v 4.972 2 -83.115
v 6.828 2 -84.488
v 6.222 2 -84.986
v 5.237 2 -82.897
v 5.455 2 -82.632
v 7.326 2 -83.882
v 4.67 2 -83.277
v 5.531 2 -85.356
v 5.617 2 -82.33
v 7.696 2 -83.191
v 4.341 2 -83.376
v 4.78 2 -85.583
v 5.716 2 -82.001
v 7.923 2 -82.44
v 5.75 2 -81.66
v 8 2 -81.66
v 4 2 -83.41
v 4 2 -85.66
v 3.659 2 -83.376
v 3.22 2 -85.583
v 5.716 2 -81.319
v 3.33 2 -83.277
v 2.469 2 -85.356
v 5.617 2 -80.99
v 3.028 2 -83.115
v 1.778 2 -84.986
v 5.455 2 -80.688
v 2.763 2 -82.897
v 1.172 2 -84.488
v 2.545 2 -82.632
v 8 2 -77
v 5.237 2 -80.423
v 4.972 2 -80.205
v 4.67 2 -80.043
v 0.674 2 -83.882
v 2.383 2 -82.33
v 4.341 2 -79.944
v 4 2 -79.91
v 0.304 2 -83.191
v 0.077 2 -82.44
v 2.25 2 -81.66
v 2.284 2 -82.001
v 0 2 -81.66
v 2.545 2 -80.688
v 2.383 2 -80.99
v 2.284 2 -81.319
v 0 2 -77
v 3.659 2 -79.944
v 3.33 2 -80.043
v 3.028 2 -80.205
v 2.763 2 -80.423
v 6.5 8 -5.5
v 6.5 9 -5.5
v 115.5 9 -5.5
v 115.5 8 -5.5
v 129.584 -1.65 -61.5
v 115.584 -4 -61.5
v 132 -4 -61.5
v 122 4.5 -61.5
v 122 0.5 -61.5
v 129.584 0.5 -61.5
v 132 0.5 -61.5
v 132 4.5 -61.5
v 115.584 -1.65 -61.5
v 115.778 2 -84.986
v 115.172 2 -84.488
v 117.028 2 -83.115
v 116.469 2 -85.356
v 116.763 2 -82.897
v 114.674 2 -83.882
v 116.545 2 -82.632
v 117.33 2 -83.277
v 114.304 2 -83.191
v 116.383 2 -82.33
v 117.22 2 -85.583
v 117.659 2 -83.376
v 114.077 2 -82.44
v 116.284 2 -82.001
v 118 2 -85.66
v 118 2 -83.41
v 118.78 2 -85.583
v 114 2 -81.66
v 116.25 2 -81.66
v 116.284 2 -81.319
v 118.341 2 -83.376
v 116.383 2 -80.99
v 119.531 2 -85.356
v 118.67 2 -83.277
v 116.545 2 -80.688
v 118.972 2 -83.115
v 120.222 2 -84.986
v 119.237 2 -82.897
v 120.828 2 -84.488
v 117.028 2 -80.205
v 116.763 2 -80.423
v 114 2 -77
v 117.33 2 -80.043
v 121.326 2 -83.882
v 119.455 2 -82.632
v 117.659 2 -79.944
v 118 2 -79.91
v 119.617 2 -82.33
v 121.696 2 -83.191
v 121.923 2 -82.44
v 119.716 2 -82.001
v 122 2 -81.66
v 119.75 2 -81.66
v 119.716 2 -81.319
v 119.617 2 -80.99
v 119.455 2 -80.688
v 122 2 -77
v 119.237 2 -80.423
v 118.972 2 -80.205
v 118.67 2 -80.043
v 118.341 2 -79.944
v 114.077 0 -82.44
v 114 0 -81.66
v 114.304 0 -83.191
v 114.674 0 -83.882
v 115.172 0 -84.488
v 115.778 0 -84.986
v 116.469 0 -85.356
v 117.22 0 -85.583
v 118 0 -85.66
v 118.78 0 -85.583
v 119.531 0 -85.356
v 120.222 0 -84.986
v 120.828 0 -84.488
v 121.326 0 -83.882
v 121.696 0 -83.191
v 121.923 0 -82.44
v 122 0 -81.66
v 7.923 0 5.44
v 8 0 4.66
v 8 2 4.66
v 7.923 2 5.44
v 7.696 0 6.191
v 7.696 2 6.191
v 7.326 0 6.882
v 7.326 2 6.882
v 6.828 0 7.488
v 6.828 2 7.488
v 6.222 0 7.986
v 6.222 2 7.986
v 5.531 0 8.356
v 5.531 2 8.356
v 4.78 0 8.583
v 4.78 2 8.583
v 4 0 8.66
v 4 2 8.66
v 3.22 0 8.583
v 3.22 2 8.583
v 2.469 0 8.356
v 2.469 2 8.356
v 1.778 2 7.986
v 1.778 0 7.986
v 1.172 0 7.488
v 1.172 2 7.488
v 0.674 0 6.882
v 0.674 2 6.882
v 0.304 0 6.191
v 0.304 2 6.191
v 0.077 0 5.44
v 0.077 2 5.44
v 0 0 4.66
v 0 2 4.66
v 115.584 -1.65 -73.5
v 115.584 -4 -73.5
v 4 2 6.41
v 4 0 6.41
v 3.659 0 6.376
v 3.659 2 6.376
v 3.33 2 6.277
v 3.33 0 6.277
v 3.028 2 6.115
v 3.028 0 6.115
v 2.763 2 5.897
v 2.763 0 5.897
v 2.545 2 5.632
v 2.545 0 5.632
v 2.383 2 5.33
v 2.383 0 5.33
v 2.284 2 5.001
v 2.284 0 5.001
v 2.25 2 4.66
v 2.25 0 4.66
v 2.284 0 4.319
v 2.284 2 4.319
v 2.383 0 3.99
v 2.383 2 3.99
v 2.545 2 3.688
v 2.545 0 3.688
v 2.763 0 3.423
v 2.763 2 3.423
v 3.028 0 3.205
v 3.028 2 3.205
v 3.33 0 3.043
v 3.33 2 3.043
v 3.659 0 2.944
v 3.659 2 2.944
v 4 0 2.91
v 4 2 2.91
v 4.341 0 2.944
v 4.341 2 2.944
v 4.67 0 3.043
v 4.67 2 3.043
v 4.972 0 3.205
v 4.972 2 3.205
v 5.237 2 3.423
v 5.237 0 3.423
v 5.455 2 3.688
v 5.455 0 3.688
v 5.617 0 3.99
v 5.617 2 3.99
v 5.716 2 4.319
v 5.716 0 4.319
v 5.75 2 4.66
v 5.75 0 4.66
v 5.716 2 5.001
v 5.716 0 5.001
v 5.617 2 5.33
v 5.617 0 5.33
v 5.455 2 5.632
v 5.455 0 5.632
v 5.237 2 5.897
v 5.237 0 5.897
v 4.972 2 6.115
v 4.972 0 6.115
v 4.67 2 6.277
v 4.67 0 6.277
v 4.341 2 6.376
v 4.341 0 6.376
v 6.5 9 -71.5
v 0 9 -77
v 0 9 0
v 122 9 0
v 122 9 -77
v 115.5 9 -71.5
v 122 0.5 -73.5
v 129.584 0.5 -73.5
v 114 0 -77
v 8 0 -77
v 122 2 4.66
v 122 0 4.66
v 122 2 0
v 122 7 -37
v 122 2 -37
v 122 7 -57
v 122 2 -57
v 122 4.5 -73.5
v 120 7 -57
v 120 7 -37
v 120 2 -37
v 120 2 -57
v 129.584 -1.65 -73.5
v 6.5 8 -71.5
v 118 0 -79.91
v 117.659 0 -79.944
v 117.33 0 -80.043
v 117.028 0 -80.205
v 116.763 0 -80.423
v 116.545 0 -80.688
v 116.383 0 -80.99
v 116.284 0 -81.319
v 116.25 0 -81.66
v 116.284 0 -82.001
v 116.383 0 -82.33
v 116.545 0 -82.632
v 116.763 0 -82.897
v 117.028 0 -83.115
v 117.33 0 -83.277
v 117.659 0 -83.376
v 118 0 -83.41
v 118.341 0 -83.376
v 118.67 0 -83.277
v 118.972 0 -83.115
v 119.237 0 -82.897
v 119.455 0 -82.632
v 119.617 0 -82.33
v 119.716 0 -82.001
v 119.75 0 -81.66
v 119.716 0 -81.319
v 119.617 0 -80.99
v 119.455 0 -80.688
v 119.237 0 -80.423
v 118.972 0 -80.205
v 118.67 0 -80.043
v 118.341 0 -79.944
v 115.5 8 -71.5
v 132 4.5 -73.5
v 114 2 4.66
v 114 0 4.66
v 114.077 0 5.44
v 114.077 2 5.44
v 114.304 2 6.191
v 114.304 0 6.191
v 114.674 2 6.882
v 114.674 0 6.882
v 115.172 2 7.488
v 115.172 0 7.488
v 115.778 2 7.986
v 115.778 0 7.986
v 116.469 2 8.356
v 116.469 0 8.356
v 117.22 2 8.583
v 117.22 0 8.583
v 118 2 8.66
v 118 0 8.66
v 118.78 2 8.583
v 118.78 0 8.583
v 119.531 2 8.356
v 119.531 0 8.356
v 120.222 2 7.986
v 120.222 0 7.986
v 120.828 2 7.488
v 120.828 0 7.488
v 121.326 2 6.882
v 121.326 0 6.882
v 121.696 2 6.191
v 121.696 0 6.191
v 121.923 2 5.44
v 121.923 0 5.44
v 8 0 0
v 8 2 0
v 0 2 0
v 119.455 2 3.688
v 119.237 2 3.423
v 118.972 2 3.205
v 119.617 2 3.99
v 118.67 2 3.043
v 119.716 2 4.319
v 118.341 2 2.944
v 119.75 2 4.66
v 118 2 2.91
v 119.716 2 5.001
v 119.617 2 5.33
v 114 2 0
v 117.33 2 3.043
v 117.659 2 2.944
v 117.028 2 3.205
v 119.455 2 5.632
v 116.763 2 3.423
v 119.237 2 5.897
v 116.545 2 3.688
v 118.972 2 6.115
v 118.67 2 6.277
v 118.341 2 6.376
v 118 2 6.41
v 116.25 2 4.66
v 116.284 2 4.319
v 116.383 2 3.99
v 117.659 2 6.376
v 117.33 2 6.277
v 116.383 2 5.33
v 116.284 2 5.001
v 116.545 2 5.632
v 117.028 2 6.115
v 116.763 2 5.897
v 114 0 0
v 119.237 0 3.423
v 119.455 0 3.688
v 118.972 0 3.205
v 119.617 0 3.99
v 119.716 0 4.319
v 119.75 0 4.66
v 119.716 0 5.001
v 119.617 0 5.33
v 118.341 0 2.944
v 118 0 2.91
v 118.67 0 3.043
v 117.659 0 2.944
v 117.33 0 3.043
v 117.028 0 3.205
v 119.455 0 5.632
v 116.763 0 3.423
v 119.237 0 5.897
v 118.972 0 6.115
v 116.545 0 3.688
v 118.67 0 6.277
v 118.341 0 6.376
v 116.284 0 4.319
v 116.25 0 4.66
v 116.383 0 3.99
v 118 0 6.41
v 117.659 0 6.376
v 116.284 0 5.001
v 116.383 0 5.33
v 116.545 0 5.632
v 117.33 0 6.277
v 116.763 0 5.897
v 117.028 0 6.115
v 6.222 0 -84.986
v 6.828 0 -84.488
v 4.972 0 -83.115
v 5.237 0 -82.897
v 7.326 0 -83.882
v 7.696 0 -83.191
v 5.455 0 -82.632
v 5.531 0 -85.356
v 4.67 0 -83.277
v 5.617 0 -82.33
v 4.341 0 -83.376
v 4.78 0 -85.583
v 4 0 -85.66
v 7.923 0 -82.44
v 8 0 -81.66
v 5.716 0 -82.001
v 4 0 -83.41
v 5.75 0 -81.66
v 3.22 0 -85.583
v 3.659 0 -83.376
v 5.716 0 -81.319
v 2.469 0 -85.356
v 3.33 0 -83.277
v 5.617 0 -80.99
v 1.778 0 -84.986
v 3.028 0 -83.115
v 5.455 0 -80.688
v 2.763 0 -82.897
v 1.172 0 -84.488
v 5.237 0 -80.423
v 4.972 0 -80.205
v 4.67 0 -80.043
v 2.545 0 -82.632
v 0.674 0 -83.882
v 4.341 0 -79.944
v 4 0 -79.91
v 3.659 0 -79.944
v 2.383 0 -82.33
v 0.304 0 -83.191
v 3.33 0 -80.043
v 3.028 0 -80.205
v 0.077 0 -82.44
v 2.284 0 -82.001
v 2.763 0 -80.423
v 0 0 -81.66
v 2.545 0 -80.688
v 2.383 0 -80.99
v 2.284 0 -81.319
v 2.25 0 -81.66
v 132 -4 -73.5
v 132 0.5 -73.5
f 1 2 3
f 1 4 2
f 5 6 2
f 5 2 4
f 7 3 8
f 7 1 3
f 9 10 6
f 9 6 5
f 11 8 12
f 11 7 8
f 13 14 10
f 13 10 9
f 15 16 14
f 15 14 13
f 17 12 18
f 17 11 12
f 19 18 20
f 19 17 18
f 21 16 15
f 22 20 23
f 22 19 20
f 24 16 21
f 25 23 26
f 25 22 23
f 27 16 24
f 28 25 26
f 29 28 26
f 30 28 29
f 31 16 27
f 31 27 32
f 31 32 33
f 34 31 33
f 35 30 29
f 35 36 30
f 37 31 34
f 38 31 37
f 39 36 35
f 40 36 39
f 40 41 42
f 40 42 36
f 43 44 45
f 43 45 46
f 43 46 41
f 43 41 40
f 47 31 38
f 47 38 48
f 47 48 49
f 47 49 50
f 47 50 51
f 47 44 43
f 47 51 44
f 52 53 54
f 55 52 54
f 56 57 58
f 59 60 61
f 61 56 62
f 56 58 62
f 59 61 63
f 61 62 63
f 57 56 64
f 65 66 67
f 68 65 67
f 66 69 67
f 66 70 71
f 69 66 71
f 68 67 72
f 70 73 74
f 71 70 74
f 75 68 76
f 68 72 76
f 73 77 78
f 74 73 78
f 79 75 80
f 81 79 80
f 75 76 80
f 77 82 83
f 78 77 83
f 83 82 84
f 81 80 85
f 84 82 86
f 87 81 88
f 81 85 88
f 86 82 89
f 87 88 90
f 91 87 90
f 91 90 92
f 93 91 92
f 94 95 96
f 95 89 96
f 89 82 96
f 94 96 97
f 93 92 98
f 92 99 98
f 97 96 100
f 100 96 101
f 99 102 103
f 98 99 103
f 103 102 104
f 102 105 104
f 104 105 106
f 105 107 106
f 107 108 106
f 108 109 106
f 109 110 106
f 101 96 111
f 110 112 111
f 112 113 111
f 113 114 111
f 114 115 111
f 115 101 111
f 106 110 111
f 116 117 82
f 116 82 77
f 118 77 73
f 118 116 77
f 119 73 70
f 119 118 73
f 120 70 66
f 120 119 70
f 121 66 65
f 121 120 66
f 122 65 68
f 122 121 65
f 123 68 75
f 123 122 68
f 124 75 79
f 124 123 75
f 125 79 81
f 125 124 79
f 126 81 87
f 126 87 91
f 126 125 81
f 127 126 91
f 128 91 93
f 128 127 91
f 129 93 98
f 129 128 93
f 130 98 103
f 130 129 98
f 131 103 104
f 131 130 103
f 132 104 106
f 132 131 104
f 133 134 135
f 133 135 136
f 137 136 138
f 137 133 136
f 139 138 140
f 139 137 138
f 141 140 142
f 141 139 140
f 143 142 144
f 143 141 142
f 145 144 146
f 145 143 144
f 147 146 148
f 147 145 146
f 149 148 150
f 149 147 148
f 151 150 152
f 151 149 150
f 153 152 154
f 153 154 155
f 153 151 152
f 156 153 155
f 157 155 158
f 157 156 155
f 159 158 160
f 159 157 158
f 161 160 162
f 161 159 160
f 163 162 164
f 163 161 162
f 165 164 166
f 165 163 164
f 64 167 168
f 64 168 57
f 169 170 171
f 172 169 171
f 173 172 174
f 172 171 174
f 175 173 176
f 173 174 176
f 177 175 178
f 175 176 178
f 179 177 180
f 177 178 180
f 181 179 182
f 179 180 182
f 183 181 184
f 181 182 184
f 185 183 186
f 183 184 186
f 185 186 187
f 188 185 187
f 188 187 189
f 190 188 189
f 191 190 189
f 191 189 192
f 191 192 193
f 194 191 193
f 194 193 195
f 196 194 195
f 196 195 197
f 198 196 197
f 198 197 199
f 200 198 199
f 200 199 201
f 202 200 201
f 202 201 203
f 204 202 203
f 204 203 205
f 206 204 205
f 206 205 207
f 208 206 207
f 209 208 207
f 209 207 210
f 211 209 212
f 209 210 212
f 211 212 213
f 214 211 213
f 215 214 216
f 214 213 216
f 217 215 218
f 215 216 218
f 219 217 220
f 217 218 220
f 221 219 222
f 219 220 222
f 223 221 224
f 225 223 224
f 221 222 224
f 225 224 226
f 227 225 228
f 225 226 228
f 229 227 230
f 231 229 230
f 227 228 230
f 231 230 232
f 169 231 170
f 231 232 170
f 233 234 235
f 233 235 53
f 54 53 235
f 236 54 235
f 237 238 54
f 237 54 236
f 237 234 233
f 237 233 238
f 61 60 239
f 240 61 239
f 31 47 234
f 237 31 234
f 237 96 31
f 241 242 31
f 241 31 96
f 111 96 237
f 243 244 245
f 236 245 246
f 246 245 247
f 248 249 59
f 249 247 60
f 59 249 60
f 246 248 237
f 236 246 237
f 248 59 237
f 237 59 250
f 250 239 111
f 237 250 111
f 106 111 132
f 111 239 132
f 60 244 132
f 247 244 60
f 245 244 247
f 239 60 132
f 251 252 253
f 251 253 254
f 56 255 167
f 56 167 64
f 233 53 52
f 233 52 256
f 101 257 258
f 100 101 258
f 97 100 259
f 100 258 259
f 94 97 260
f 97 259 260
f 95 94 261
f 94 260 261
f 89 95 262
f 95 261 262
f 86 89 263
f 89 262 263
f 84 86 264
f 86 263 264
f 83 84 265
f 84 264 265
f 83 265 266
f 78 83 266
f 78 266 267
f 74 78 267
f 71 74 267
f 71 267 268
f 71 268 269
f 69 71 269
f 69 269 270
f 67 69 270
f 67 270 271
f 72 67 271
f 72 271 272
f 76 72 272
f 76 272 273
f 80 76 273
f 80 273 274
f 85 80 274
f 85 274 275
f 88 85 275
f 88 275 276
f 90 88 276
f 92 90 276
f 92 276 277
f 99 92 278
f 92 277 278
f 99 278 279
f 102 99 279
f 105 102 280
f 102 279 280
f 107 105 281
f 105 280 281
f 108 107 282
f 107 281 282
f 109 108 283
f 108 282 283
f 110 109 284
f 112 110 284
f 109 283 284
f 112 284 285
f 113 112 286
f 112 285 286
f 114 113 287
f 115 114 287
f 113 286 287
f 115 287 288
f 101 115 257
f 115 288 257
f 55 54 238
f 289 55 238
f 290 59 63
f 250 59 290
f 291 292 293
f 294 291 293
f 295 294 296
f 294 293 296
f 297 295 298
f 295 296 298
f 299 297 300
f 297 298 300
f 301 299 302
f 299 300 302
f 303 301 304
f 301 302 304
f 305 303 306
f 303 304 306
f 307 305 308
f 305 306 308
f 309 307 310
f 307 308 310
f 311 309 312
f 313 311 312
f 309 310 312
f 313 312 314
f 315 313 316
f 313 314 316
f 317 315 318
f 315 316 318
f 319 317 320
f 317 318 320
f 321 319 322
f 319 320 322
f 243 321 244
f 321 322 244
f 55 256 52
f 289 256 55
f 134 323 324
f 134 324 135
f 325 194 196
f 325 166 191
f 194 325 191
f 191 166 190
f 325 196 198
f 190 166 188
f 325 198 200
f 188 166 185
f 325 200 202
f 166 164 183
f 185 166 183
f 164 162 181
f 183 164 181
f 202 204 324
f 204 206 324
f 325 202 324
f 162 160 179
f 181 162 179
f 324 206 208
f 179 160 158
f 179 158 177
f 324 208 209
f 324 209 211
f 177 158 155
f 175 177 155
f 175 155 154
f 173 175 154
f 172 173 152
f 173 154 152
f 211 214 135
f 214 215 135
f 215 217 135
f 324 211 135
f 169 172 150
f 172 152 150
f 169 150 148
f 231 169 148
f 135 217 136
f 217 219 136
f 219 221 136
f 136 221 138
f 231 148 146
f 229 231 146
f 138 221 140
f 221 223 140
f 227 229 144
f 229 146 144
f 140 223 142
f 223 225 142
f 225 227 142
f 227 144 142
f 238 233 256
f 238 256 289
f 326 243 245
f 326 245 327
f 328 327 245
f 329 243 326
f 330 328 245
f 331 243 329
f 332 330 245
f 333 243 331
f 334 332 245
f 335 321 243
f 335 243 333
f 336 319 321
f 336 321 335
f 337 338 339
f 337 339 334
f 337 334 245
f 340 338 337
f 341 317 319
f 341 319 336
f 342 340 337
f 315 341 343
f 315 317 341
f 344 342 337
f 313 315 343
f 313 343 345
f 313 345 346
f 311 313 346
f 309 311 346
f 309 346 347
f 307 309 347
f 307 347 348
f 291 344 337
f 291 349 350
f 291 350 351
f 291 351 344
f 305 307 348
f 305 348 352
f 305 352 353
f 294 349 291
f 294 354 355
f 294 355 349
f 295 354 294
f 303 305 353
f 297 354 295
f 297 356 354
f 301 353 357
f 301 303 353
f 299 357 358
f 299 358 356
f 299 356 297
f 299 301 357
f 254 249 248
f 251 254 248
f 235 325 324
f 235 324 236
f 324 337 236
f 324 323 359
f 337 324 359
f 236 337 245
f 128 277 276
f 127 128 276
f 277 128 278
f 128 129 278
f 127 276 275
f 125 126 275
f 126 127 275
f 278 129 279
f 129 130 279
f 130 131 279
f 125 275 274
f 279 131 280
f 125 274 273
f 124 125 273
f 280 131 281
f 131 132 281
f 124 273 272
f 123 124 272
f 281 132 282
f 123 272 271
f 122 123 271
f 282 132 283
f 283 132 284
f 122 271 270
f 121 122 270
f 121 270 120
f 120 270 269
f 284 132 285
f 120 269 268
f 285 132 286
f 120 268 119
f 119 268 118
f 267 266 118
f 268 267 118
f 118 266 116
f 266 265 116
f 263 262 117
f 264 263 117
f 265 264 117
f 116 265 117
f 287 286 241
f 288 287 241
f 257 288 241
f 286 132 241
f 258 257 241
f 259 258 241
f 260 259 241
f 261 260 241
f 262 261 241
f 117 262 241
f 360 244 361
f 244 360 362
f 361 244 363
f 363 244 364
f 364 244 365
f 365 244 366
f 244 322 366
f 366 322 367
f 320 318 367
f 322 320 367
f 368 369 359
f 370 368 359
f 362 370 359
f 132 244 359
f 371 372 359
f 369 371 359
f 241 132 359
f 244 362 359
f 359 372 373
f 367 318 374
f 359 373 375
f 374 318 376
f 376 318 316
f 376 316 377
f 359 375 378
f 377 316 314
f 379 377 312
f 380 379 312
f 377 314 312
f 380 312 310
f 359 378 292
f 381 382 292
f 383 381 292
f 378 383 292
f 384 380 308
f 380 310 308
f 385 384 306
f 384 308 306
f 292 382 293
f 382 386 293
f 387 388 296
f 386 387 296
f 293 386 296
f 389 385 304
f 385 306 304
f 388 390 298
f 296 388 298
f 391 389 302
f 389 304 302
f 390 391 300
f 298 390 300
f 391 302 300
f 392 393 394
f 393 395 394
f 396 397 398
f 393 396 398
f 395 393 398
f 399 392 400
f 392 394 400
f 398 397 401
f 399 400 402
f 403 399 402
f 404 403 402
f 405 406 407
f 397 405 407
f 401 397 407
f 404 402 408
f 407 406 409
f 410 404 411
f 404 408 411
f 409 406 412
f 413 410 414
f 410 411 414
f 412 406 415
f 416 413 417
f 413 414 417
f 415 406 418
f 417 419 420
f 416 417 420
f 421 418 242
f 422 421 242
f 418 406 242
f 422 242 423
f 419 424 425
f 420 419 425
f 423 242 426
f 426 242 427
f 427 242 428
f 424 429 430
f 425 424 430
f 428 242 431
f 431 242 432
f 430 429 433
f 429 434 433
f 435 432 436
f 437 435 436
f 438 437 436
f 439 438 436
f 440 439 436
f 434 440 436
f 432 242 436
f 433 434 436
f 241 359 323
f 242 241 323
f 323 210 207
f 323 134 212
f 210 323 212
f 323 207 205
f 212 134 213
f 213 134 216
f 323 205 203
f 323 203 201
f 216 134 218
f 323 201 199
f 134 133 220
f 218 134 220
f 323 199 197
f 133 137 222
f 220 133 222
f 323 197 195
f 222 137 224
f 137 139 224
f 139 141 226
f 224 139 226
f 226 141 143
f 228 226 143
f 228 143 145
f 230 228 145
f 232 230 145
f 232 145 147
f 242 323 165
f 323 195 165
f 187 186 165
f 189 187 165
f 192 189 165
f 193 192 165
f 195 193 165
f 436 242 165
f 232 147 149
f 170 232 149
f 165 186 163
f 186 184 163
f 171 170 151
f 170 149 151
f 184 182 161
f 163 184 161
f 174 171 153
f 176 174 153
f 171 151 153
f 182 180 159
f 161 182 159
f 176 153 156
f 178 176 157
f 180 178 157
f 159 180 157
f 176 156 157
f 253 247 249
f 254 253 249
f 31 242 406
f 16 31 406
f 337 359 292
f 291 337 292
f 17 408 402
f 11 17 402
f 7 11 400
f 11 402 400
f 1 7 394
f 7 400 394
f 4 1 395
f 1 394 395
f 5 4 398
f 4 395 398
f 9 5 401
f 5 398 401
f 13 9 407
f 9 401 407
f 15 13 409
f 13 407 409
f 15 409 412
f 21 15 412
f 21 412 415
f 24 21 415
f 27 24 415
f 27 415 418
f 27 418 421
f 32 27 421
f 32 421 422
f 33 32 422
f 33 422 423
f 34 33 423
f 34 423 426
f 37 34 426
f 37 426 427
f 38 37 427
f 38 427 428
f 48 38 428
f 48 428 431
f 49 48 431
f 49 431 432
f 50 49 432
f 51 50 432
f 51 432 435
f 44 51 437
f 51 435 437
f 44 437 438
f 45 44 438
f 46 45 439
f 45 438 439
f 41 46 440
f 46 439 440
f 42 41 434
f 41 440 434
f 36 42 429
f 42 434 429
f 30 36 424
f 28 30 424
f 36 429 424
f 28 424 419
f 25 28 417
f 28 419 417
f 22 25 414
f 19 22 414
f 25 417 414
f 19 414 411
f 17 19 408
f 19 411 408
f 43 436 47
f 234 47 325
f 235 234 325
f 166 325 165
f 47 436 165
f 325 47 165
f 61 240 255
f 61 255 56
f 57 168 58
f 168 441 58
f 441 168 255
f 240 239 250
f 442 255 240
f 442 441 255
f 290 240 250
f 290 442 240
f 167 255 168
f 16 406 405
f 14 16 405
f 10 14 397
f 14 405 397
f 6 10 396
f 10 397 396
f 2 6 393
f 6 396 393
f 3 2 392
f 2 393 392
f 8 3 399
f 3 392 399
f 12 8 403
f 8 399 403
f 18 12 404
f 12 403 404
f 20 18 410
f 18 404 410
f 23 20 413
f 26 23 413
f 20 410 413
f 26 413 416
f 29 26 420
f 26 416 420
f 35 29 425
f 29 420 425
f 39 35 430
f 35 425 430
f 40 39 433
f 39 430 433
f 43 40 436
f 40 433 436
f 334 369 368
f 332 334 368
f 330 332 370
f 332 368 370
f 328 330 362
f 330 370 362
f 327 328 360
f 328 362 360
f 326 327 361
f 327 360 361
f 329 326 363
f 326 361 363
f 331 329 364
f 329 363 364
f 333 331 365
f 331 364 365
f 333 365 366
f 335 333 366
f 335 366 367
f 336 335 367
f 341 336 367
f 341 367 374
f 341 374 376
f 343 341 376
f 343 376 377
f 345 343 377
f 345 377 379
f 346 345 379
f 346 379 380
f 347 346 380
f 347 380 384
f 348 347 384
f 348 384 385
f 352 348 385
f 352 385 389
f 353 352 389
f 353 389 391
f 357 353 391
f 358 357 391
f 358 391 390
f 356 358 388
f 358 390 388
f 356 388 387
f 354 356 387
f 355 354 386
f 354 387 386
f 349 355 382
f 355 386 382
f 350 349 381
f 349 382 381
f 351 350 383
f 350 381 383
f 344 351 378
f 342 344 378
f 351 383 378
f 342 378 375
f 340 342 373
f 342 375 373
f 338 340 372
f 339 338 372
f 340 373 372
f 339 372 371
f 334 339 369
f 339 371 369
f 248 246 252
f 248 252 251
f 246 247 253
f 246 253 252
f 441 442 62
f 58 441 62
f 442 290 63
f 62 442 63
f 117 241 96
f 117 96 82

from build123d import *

# Parameters (mm, degrees)
SKETCH1_W           = 122
SKETCH1_H           = 77
BOSS_EXTRUDE1_DEPTH = 9
SKETCH2_W           = 109
SKETCH2_H           = 66
CUT_EXTRUDE1_DEPTH  = 1
BOSS_EXTRUDE2_DEPTH = 2
SKETCH4_R           = 1.75
CUT_EXTRUDE3_DEPTH  = 4
SKETCH5_W           = 12
SKETCH5_H           = 4
SKETCH5_W_2         = 20
SKETCH5_H_2         = 5
CUT_EXTRUDE4_DEPTH  = 2
SKETCH11_W          = 12
SKETCH11_H          = 4
BOSS_EXTRUDE4_DEPTH = 10
SKETCH12_W          = 2.415928069
SKETCH12_H          = 12
BOSS_EXTRUDE5_DEPTH = 4.5
SKETCH13_W          = 12
SKETCH13_H          = 2.350282926
BOSS_EXTRUDE6_DEPTH = 14
SKETCH11_2_W        = 12
SKETCH11_2_H        = 4
BOSS_EXTRUDE7_DEPTH = 14


with BuildPart() as part:
    # Sketch1 → Boss-Extrude1 (new body)
    with BuildSketch(Plane(origin=(0, 0, 0), x_dir=(1, 0, 0), z_dir=(0, 1, 0))):
        with Locations((61, 38.5)):
            Rectangle(SKETCH1_W, SKETCH1_H)
    extrude(amount=BOSS_EXTRUDE1_DEPTH)

    # Sketch2 → Cut-Extrude1 (cut)
    with BuildSketch(Plane(origin=(0, 9, 0), x_dir=(1, 0, 0), z_dir=(0, 1, 0))):
        with Locations((61, 38.5)):
            Rectangle(SKETCH2_W, SKETCH2_H)
    extrude(amount=-CUT_EXTRUDE1_DEPTH, mode=Mode.SUBTRACT)

    # Sketch3 → Boss-Extrude2 (add)
    with BuildSketch(Plane.XZ):
        with BuildLine():
            Line((0, -81.66), (0, -72.34))
            ThreePointArc((0, -72.34), (4, -68.34), (8, -72.34))
            Line((8, -72.34), (8, -81.66))
            ThreePointArc((8, -81.66), (4, -85.66), (0, -81.66))
        make_face()
        with BuildLine():
            Line((122, -81.66), (122, -72.34))
            ThreePointArc((122, -72.34), (118, -68.34), (114, -72.34))
            Line((114, -72.34), (114, -81.66))
            ThreePointArc((114, -81.66), (118, -85.66), (122, -81.66))
        make_face()
        with BuildLine():
            Line((0, 4.66), (0, -4.66))
            ThreePointArc((0, -4.66), (4, -8.66), (8, -4.66))
            Line((8, -4.66), (8, 4.66))
            ThreePointArc((8, 4.66), (4, 8.66), (0, 4.66))
        make_face()
        with BuildLine():
            Line((122, 4.66), (122, -4.66))
            ThreePointArc((122, -4.66), (118, -8.66), (114, -4.66))
            Line((114, -4.66), (114, 4.66))
            ThreePointArc((114, 4.66), (118, 8.66), (122, 4.66))
        make_face()
    extrude(amount=-BOSS_EXTRUDE2_DEPTH)

    # Sketch4 → Cut-Extrude3 (cut)
    with BuildSketch(Plane.XZ):
        with Locations((4, -81.66)):
            Circle(SKETCH4_R)
        with Locations((118, -81.66)):
            Circle(SKETCH4_R)
        with Locations((4, 4.66)):
            Circle(SKETCH4_R)
        with Locations((118, 4.66)):
            Circle(SKETCH4_R)
    extrude(amount=-CUT_EXTRUDE3_DEPTH, mode=Mode.SUBTRACT)

    # Sketch5 → Cut-Extrude4 (cut)
    with BuildSketch(Plane(origin=(122, 0, 0), x_dir=(0, 0, -1), z_dir=(1, 0, 0))):
        with Locations((67.5, 2.5)):
            Rectangle(SKETCH5_W, SKETCH5_H)
        with Locations((47, 4.5)):
            Rectangle(SKETCH5_W_2, SKETCH5_H_2)
    extrude(amount=-CUT_EXTRUDE4_DEPTH, mode=Mode.SUBTRACT)



with BuildPart() as body_2:
    # Sketch11 → Boss-Extrude4 (new body)
    with BuildSketch(Plane(origin=(122, 0, 0), x_dir=(0, 0, -1), z_dir=(1, 0, 0))):
        with Locations((67.5, 2.5)):
            Rectangle(SKETCH11_W, SKETCH11_H)
    extrude(amount=BOSS_EXTRUDE4_DEPTH)

    # Sketch12 → Boss-Extrude5 (add)
    with BuildSketch(Plane.XZ.offset(-0.5)):
        with Locations((130.792035966, -67.5)):
            Rectangle(SKETCH12_W, SKETCH12_H)
    extrude(amount=BOSS_EXTRUDE5_DEPTH)

    # Sketch13 → Boss-Extrude6 (add)
    with BuildSketch(Plane.ZY.offset(-129.584071931)):
        with Locations((-67.5, -2.824858537)):
            Rectangle(SKETCH13_W, SKETCH13_H)
    extrude(amount=BOSS_EXTRUDE6_DEPTH)


with BuildPart() as part_1:
    add(part.part)

    add(body_2.part)  # Boss-Extrude7 merges body 2
    # Sketch11<2> → Boss-Extrude7 (add)
    with BuildSketch(Plane(origin=(122, 0, 0), x_dir=(0, 0, -1), z_dir=(1, 0, 0))):
        with Locations((67.5, 2.5)):
            Rectangle(SKETCH11_2_W, SKETCH11_2_H)
    extrude(amount=-BOSS_EXTRUDE7_DEPTH)


solid = part_1.part
